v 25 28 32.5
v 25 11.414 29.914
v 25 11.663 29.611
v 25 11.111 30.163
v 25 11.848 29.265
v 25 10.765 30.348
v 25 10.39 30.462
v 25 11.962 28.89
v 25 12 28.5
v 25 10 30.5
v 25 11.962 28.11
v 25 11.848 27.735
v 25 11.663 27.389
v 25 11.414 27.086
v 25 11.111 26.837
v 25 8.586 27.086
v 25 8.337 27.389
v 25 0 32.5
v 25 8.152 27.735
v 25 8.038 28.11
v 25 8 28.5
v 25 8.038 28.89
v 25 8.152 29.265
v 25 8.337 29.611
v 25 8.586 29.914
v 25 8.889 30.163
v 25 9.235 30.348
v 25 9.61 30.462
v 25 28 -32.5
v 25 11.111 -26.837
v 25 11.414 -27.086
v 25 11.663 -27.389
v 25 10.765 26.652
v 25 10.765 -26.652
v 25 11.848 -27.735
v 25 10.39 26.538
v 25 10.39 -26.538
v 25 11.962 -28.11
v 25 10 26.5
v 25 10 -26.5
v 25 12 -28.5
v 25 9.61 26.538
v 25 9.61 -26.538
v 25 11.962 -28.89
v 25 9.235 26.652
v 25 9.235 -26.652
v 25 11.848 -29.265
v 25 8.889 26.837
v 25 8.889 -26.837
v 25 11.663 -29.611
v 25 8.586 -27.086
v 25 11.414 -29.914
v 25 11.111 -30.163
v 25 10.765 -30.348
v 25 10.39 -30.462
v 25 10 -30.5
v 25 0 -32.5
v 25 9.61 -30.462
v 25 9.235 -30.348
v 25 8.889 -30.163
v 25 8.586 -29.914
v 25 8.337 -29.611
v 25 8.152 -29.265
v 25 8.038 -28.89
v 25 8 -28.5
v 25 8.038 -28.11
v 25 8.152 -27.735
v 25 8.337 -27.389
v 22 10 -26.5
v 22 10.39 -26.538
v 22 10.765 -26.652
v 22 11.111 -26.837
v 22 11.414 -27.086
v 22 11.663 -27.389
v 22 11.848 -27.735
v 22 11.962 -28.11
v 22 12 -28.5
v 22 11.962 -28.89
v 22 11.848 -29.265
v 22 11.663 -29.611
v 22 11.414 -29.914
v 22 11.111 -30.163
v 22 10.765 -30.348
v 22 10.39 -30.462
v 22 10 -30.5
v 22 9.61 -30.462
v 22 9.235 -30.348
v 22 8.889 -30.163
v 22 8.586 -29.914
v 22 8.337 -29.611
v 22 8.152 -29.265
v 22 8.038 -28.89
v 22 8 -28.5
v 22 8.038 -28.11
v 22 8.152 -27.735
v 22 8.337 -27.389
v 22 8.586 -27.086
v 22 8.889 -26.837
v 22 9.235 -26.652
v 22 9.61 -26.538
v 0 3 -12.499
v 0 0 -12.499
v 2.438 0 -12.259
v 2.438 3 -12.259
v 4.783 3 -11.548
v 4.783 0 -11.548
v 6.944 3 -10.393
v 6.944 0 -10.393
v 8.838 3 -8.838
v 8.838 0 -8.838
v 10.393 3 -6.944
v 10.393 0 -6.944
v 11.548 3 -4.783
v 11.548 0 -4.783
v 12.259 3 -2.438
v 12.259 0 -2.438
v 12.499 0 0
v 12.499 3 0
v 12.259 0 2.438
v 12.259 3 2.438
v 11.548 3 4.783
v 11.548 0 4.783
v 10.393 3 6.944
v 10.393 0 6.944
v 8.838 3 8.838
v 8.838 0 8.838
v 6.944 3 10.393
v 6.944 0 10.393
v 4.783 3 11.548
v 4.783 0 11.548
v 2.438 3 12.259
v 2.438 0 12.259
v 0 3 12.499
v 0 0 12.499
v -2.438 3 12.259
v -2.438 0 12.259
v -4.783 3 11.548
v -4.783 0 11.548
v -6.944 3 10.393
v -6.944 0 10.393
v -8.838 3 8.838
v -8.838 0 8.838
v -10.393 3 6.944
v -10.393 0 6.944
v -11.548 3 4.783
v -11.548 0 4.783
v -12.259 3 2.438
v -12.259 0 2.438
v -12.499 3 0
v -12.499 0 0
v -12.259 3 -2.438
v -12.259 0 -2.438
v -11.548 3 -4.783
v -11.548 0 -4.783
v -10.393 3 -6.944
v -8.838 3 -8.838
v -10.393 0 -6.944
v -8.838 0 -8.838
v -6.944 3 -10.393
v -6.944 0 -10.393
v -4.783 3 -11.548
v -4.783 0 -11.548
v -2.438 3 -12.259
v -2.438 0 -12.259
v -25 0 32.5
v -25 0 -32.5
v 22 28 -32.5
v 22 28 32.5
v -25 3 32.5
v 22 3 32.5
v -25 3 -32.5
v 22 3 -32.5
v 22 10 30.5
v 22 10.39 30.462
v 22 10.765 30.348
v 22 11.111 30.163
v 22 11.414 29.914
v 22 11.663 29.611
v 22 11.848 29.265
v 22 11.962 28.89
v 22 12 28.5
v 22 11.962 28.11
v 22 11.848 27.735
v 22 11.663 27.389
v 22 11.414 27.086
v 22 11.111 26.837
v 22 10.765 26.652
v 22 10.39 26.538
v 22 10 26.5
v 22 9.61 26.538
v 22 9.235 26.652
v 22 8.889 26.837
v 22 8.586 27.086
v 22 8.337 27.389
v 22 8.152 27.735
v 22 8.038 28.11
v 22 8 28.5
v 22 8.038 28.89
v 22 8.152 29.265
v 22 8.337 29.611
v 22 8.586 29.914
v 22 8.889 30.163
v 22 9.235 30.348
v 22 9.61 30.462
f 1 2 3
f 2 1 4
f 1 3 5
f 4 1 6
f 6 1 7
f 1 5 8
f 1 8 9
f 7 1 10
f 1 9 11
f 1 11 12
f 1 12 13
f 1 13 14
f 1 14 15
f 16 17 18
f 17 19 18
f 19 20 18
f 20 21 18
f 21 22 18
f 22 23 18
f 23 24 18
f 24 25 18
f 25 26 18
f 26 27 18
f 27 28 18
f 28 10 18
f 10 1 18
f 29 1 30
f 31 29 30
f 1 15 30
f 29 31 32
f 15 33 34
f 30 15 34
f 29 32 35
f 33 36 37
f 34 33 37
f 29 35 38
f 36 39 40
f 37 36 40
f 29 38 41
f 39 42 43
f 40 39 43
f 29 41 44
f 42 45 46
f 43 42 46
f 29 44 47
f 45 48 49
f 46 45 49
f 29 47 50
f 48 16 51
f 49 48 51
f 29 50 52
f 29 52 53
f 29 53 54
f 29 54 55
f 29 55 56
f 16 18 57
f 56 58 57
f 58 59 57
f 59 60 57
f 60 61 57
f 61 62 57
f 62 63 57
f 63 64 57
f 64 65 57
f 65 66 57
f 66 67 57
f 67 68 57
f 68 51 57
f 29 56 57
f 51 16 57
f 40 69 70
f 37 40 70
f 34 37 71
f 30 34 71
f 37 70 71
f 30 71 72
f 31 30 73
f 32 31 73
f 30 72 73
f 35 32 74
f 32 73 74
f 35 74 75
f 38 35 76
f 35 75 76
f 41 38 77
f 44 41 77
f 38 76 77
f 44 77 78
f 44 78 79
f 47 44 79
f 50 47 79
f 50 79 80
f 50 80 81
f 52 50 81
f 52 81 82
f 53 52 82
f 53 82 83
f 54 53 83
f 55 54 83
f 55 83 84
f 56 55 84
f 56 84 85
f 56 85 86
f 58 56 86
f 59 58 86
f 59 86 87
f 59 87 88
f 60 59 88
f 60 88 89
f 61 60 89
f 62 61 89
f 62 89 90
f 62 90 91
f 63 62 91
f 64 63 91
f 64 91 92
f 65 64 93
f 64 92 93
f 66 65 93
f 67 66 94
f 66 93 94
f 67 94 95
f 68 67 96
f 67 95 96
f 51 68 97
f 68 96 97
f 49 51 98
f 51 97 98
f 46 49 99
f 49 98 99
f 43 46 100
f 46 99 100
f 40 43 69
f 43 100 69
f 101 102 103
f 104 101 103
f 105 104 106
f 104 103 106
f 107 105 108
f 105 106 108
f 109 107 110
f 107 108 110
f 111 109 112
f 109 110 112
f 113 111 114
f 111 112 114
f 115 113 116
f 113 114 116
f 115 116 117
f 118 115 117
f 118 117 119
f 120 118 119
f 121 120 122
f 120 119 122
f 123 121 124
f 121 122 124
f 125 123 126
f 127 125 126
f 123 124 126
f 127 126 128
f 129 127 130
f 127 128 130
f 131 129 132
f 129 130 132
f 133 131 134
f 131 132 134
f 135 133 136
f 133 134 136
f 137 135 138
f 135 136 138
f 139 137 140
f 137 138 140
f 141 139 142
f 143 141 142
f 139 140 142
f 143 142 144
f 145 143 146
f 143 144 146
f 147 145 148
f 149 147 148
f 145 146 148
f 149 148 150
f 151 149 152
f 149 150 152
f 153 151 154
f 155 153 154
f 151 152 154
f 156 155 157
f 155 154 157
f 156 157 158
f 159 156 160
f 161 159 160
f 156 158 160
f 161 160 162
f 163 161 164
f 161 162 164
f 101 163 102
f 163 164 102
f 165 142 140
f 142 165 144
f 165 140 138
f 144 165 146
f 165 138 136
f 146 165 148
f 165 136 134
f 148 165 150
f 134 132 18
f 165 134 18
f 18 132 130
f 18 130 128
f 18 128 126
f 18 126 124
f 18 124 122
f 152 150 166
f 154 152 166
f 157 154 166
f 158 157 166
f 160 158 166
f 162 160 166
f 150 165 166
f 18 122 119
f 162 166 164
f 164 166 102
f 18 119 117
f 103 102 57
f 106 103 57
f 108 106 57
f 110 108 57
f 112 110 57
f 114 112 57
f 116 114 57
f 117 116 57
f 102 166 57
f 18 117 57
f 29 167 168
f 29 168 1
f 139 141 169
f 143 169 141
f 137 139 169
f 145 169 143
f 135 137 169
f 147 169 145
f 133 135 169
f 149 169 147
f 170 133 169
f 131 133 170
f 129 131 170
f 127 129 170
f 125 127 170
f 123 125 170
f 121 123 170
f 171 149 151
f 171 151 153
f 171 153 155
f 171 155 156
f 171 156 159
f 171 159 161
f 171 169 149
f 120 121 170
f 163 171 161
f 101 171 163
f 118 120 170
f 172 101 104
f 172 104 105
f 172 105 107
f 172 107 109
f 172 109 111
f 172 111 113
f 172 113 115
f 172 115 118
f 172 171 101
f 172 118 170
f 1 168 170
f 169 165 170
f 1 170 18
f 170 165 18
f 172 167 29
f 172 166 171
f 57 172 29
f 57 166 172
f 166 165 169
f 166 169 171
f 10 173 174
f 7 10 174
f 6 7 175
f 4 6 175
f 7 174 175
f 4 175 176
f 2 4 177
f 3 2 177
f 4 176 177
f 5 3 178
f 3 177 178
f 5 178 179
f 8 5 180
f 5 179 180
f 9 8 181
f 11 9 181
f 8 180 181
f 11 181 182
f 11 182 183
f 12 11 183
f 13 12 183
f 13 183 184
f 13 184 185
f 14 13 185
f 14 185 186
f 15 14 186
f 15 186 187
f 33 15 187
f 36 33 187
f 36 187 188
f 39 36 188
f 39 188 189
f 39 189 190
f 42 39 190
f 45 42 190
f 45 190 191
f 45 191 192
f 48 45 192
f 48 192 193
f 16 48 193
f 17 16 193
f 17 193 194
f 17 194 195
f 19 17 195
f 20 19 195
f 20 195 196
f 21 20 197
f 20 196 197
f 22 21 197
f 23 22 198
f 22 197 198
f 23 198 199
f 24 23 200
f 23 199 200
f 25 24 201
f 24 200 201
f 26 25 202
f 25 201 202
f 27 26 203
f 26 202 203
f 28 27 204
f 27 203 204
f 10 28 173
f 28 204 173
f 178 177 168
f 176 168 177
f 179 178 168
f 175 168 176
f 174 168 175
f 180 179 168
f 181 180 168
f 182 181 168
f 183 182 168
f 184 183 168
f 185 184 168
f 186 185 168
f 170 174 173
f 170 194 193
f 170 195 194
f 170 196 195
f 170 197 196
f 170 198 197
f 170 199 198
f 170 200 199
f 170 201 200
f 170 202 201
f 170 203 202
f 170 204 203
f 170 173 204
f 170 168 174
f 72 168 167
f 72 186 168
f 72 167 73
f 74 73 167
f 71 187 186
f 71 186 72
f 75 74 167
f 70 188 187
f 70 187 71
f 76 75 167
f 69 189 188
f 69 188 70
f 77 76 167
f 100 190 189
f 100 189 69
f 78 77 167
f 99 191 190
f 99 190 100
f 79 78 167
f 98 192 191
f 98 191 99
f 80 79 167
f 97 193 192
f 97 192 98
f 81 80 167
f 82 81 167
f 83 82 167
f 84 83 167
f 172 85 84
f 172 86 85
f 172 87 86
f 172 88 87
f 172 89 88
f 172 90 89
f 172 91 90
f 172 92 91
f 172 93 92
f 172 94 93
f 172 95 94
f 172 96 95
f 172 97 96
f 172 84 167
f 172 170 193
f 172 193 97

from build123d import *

# Parameters (mm, degrees)
SKETCH1_W           = 50
SKETCH1_H           = 65
BOSS_EXTRUDE1_DEPTH = 3
SKETCH2_W           = 3
SKETCH2_H           = 65
BOSS_EXTRUDE2_DEPTH = 25
SKETCH4_R           = 12.499228858
CUT_EXTRUDE1_DEPTH  = 3
SKETCH5_R           = 2
CUT_EXTRUDE2_DEPTH  = 30


with BuildPart() as part:
    # Sketch1 → Boss-Extrude1 (new body)
    with BuildSketch(Plane(origin=(0, 0, 0), x_dir=(1, 0, 0), z_dir=(0, 1, 0))):
        Rectangle(SKETCH1_W, SKETCH1_H)
    extrude(amount=BOSS_EXTRUDE1_DEPTH)

    # Sketch2 → Boss-Extrude2 (add)
    with BuildSketch(Plane(origin=(0, 3, 0), x_dir=(1, 0, 0), z_dir=(0, 1, 0))):
        with Locations((23.5, 0)):
            Rectangle(SKETCH2_W, SKETCH2_H)
    extrude(amount=BOSS_EXTRUDE2_DEPTH)

    # Sketch4 → Cut-Extrude1 (cut)
    with BuildSketch(Plane.XZ):
        with Locations(Location((0, 0, 0), (0, 0, 270))):
            Circle(SKETCH4_R)
    extrude(amount=-CUT_EXTRUDE1_DEPTH, mode=Mode.SUBTRACT)

    # Sketch5 → Cut-Extrude2 (cut)
    with BuildSketch(Plane.ZY.offset(-22)):
        with Locations((28.5, 10)):
            Circle(SKETCH5_R)
        with Locations((-28.5, 10)):
            Circle(SKETCH5_R)
    extrude(amount=-CUT_EXTRUDE2_DEPTH, mode=Mode.SUBTRACT)


solid = part.part
